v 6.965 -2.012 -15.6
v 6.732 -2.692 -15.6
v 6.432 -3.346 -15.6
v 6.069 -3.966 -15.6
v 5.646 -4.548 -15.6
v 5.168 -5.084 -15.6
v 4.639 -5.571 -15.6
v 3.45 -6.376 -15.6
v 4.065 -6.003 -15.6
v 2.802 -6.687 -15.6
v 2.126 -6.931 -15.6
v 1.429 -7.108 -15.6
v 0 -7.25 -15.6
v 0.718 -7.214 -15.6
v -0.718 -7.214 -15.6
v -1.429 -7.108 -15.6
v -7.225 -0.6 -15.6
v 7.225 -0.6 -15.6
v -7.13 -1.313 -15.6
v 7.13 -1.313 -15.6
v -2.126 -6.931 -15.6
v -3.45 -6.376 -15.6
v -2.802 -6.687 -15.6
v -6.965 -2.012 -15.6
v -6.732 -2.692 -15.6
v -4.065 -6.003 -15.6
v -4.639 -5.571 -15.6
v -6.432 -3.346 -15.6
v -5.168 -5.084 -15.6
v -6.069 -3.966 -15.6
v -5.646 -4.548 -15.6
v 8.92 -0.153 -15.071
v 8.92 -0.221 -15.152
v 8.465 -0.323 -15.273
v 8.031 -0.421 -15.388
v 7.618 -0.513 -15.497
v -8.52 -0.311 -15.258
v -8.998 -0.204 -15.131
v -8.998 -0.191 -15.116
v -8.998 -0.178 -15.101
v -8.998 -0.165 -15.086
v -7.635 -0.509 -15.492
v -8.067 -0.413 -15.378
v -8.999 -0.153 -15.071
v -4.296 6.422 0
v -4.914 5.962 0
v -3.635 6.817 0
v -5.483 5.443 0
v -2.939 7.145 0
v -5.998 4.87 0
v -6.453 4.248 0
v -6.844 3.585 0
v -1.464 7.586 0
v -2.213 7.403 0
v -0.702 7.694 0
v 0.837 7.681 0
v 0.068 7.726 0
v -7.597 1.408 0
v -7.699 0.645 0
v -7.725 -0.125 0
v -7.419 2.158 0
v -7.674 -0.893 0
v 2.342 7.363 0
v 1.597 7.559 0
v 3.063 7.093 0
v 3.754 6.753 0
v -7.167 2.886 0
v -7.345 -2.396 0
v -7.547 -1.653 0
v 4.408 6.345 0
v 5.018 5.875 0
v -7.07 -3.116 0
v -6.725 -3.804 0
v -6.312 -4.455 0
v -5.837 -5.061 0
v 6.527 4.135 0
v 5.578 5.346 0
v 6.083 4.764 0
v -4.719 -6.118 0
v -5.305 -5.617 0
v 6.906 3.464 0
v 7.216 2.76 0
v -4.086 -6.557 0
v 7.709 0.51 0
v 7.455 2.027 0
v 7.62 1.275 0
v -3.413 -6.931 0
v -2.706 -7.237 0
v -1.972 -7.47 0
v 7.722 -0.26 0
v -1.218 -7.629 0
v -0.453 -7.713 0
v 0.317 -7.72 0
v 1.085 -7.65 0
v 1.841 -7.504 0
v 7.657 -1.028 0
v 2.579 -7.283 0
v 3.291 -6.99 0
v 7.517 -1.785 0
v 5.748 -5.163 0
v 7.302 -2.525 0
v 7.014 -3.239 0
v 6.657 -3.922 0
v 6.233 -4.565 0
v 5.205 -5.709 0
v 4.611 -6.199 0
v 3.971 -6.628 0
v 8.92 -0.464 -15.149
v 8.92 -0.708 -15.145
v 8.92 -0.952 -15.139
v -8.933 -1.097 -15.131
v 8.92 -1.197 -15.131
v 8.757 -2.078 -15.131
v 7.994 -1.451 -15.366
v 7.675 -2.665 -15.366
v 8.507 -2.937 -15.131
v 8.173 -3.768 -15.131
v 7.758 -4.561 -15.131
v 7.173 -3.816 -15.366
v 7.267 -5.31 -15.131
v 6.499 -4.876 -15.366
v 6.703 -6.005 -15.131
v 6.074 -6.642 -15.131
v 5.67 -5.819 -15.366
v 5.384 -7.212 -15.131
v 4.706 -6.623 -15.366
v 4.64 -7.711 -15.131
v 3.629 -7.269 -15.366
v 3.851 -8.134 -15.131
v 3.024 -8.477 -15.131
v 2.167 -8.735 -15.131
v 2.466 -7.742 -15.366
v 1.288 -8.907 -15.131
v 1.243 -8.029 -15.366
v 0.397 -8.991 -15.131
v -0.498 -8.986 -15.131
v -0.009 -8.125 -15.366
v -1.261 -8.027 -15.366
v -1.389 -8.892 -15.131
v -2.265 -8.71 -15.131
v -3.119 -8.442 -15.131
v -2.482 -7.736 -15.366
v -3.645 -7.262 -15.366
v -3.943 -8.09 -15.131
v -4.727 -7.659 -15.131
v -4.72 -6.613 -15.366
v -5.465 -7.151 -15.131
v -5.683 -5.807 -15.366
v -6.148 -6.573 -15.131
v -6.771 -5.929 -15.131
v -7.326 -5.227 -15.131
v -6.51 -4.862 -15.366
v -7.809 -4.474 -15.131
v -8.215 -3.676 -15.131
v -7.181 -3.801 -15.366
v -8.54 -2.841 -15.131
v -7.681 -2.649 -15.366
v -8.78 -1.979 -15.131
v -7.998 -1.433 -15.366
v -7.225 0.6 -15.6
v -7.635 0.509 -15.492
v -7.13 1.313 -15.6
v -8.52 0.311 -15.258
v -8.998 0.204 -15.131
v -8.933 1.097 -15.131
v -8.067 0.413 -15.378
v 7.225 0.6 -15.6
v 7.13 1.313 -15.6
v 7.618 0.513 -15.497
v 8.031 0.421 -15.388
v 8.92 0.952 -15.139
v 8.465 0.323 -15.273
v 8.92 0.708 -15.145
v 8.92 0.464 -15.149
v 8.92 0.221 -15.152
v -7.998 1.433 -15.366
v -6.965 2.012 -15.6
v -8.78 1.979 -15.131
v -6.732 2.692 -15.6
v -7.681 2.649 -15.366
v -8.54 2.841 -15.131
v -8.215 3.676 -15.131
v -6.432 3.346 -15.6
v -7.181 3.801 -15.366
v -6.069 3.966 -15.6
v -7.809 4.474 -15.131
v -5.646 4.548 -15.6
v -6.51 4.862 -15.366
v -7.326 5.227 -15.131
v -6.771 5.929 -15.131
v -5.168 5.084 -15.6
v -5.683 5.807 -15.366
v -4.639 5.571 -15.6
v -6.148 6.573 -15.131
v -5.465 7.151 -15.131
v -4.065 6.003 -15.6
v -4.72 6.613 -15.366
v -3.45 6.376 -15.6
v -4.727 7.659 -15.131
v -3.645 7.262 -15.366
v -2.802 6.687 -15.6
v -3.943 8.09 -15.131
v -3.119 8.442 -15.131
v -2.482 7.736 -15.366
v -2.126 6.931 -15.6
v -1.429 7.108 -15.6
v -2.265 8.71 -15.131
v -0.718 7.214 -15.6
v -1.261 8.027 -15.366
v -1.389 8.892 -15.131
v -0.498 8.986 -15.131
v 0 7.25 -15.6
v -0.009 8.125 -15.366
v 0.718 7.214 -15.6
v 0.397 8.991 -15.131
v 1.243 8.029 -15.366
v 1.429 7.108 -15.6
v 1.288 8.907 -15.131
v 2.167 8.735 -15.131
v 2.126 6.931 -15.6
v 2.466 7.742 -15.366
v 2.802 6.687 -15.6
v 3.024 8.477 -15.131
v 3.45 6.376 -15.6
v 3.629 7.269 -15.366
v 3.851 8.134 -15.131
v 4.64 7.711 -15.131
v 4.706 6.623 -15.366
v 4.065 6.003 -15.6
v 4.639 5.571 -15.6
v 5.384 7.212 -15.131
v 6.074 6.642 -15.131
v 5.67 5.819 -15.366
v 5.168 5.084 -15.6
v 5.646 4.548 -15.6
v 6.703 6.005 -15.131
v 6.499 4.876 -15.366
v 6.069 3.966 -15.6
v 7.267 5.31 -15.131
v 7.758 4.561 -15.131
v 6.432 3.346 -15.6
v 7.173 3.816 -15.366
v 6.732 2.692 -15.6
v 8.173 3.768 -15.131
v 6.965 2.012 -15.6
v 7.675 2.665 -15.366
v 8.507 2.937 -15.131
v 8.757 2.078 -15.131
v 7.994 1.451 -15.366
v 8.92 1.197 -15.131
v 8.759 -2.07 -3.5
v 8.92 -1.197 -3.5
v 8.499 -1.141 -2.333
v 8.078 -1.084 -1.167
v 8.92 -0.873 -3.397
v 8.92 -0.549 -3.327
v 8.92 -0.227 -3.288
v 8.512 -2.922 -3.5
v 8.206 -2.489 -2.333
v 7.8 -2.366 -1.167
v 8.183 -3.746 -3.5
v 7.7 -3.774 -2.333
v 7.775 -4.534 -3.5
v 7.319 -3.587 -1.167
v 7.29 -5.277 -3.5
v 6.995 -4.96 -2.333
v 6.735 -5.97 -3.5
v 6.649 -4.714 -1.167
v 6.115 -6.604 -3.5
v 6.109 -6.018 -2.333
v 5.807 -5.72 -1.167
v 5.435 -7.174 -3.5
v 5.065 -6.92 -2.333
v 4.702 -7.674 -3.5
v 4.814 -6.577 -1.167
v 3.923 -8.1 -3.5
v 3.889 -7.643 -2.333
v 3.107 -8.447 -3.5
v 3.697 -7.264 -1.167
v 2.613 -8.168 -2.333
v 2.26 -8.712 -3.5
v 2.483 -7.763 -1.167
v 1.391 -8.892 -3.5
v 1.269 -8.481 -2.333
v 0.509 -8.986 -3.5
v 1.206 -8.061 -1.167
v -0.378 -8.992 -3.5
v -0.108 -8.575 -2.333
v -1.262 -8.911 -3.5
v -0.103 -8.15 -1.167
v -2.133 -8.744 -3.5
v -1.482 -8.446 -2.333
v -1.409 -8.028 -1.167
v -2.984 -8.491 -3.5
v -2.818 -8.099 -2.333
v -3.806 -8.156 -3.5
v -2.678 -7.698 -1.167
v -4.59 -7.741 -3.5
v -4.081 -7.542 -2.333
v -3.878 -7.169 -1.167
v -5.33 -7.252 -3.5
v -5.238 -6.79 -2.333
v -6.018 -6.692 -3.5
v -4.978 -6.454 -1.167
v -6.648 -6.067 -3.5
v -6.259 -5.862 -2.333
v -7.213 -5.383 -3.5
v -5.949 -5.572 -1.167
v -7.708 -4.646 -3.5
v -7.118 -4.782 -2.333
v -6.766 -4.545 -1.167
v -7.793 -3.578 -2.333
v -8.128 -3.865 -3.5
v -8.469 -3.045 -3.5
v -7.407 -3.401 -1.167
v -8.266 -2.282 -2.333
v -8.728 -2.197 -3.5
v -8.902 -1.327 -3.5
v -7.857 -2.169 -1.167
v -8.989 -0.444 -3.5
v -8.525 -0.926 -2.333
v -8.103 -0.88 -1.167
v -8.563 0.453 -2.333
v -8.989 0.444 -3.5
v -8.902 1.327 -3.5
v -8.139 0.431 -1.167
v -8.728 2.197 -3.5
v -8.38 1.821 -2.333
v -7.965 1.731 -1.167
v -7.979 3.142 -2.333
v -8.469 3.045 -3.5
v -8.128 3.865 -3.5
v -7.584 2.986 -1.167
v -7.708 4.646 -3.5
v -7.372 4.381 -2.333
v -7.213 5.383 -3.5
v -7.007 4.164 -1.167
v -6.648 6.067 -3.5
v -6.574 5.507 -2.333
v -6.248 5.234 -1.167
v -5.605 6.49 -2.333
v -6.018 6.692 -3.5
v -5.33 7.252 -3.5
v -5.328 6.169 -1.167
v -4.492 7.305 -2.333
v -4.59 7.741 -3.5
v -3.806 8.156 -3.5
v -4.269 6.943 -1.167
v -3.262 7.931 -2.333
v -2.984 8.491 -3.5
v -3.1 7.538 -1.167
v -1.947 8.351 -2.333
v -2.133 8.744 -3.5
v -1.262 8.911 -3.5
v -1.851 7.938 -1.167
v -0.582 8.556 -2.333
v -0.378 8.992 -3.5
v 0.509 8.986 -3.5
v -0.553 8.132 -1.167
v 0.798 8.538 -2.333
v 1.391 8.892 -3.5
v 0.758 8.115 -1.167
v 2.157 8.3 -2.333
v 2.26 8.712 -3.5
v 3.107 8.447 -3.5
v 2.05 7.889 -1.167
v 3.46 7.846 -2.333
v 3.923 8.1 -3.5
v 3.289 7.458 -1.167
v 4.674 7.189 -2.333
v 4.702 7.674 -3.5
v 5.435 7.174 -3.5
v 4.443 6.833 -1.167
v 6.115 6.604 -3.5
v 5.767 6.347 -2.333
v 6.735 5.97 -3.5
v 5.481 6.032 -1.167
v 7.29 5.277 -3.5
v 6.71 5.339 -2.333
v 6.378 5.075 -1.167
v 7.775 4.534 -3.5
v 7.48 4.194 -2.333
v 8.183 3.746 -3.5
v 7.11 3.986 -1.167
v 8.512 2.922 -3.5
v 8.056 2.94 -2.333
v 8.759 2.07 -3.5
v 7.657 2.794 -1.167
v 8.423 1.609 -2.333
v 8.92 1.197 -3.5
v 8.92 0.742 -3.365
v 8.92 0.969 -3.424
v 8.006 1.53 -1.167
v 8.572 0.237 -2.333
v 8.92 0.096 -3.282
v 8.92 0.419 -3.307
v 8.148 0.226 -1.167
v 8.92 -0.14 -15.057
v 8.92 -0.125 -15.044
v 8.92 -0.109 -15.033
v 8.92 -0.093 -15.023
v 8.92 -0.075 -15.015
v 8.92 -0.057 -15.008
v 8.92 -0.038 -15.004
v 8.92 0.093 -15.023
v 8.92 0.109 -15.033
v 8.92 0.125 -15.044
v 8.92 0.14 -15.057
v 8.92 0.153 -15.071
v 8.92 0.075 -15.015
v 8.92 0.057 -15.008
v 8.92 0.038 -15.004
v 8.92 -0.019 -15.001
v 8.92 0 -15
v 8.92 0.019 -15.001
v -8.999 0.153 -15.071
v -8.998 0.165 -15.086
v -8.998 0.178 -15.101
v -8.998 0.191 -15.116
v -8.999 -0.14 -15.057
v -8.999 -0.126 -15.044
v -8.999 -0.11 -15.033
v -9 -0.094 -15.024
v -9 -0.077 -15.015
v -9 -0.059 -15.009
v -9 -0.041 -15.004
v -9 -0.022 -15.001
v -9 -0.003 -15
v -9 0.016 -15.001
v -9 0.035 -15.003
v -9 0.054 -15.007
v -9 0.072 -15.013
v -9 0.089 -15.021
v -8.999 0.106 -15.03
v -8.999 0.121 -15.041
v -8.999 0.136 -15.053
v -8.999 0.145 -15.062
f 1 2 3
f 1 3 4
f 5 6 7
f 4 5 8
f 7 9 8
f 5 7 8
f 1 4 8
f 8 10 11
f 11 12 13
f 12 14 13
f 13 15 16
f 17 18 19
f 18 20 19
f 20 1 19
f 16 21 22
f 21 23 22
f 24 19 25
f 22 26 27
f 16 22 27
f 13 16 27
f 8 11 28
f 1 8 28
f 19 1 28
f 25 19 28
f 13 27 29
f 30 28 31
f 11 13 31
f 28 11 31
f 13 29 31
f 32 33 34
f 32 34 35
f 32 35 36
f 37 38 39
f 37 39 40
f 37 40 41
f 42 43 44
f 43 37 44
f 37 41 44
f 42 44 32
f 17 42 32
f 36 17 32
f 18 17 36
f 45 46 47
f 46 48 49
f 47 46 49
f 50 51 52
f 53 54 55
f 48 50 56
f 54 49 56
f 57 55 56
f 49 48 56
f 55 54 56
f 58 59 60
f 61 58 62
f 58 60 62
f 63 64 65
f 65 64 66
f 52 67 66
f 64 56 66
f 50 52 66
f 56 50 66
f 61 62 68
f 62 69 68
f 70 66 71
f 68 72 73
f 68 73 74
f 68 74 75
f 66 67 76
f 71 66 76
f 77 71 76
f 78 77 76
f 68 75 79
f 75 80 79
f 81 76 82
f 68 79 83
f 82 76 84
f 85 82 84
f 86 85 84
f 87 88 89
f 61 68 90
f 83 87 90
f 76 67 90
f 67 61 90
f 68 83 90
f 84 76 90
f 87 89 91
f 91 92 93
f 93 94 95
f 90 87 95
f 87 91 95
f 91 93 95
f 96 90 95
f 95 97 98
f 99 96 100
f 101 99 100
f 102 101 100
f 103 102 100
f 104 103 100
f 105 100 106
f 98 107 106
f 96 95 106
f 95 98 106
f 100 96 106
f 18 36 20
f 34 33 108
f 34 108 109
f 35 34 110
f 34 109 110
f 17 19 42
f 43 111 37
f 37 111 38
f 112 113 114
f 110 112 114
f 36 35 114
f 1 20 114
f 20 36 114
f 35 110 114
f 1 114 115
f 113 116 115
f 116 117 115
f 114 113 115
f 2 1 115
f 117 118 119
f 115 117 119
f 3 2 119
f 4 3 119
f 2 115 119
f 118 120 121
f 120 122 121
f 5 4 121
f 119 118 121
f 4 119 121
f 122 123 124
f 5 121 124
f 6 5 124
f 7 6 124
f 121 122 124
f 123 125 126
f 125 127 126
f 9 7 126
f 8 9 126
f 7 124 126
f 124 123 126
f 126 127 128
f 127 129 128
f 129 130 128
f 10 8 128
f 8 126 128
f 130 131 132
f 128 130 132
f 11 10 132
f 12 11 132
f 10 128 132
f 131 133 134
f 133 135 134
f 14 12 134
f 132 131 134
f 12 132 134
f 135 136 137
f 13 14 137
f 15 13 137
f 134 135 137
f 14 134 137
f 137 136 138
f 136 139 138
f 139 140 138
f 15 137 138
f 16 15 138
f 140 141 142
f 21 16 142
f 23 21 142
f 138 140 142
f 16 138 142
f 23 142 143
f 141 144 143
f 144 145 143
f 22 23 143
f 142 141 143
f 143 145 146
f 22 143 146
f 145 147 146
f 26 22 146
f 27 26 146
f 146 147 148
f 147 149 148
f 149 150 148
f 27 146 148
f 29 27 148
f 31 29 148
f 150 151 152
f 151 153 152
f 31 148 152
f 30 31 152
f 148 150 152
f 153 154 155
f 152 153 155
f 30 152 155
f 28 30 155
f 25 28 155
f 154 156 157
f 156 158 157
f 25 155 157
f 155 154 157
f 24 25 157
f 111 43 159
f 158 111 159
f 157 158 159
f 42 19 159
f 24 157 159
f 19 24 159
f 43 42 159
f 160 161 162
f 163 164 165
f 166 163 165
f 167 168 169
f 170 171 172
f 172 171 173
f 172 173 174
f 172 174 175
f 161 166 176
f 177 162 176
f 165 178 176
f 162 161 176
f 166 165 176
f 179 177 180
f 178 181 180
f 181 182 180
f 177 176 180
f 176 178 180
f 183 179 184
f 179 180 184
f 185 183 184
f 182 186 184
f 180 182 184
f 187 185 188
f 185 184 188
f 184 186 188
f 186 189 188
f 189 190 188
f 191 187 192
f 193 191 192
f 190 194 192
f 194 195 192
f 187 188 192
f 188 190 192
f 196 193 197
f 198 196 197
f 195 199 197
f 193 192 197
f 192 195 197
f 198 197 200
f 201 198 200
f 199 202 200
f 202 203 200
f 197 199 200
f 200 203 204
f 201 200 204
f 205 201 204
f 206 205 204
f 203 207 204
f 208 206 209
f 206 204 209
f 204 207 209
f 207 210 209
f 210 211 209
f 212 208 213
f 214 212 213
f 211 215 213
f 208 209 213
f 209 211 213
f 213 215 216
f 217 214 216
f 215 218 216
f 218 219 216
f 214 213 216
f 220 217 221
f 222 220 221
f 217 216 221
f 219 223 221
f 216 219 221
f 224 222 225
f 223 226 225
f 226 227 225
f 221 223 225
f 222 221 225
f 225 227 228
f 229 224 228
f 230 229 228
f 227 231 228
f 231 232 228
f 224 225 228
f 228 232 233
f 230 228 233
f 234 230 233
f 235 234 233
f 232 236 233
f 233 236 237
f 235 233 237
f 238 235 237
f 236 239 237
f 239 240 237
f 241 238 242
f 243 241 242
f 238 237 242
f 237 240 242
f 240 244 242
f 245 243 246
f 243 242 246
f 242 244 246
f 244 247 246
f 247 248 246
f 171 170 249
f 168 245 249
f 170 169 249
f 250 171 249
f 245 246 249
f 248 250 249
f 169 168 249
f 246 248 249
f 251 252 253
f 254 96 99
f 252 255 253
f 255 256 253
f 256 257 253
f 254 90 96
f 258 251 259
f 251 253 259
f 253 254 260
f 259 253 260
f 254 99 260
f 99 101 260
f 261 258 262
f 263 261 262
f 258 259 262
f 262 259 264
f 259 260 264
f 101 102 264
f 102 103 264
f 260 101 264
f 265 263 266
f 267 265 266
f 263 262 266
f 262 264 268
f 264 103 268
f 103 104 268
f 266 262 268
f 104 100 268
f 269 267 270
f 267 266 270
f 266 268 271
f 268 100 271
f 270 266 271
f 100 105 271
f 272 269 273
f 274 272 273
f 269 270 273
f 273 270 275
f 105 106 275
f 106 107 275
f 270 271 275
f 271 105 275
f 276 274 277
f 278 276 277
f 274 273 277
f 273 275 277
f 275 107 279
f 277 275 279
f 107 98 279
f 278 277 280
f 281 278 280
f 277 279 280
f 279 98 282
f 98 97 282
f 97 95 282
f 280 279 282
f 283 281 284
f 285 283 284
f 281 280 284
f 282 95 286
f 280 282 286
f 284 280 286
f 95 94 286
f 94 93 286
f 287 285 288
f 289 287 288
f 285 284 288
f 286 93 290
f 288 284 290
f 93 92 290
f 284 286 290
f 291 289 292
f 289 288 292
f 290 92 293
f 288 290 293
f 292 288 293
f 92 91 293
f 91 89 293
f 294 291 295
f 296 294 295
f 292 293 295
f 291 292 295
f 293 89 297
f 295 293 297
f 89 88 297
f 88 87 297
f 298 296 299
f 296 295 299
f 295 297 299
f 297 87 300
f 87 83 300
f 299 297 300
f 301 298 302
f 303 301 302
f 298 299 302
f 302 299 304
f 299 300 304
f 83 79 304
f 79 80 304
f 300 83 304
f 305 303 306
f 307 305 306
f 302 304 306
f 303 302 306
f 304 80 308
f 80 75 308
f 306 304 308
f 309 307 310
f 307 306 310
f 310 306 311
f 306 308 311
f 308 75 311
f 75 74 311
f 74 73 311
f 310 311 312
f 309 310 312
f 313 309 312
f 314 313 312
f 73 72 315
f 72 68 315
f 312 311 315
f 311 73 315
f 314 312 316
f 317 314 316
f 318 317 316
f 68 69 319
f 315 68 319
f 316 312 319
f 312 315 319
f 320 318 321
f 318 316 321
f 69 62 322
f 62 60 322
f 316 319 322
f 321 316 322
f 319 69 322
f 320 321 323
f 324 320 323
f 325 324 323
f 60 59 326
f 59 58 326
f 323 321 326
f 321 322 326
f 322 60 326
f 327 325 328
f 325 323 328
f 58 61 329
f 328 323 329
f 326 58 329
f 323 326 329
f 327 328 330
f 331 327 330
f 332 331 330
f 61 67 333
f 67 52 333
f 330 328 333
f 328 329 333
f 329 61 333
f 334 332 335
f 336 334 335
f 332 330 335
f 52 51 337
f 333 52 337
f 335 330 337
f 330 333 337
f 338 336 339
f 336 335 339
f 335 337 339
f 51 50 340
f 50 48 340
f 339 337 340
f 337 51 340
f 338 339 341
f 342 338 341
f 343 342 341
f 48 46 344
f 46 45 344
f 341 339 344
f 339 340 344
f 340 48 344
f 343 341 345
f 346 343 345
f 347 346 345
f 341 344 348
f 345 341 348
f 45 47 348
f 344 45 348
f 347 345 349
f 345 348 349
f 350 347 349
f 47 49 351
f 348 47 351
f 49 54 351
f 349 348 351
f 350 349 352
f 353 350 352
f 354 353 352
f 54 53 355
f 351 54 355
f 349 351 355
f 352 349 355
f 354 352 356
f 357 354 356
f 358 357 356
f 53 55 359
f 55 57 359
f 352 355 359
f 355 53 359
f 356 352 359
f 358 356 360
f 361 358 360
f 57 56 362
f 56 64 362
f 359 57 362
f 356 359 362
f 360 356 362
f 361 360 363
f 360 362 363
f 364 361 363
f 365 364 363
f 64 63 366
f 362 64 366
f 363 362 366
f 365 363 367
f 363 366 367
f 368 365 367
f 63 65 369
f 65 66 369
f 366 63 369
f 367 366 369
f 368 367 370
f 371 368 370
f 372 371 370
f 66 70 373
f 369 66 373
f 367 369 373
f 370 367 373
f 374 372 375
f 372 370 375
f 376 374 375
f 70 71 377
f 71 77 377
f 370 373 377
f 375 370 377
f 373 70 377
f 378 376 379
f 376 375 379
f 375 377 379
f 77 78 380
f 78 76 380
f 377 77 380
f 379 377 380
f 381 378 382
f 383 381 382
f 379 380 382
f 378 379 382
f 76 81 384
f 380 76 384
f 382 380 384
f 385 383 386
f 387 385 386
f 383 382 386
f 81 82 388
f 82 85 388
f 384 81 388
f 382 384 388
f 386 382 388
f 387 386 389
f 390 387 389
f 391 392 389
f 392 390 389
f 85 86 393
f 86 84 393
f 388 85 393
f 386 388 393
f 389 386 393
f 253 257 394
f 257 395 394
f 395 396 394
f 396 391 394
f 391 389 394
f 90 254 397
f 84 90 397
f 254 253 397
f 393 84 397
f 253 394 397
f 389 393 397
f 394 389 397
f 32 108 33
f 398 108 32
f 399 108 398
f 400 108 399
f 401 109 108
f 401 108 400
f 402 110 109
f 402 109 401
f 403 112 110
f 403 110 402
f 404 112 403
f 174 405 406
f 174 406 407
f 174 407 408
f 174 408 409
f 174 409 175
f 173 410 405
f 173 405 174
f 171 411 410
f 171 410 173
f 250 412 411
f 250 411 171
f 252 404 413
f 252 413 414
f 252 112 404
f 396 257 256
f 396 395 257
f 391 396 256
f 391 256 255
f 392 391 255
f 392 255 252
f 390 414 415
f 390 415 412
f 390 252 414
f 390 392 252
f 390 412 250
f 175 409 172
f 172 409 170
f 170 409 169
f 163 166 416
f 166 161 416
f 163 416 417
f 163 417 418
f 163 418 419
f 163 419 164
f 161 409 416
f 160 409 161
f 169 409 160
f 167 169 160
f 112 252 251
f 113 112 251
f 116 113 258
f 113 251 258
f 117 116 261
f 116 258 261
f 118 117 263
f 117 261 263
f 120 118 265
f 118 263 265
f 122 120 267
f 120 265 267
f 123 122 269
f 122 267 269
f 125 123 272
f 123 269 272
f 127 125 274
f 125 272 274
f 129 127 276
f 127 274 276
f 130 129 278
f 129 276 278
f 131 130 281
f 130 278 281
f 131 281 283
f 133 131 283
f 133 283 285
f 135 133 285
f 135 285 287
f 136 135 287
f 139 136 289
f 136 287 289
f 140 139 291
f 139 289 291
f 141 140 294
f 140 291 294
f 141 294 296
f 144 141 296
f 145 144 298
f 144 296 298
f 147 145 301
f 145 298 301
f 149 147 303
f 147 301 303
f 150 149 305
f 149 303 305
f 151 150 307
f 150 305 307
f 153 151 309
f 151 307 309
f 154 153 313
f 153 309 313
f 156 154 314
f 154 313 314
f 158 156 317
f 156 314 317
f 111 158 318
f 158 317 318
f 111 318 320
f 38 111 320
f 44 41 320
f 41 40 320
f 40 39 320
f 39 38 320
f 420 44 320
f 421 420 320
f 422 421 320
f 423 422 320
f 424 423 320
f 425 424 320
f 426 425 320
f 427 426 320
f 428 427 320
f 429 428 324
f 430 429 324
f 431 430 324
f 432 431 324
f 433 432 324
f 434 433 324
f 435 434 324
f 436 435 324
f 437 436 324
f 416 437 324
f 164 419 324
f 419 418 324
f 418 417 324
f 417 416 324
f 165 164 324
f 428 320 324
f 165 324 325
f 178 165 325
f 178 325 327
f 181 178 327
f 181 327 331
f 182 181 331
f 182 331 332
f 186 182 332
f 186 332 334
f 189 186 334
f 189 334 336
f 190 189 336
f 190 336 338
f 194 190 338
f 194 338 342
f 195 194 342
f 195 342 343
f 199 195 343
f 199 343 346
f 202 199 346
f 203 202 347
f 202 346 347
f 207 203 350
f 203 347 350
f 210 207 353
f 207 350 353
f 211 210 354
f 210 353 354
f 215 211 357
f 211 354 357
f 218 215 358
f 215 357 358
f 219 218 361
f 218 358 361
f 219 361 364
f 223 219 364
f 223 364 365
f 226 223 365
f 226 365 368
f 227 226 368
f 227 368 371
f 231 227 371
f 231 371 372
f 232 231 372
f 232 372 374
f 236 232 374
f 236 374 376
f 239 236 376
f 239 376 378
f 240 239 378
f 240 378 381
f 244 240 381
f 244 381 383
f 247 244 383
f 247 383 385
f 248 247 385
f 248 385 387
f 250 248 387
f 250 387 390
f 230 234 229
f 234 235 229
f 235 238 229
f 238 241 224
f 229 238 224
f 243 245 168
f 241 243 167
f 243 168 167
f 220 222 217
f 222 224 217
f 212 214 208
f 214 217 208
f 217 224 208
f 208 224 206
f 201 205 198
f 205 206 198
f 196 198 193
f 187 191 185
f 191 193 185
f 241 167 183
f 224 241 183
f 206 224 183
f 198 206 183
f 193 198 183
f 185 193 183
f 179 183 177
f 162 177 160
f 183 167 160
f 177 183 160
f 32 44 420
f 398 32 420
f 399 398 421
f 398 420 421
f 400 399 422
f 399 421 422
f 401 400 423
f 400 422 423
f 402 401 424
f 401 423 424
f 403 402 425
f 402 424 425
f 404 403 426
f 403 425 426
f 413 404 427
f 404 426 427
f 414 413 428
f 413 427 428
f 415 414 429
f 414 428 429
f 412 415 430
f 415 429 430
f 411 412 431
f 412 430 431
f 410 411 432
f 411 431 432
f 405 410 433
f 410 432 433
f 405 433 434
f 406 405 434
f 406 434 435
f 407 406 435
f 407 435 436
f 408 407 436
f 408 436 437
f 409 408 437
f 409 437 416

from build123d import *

# Parameters (mm, degrees)
SKETCH2_W               = 3.87532504
SKETCH2_H               = 22.790076604
CUT_EXTRUDE1_DEPTH      = 21.133554083
CUT_EXTRUDE2_DEPTH      = 21.133554083
CUT_EXTRUDE2_DEPTH_BACK = 21.133554083


with BuildPart() as part:
    # Sketch1 → Revolve1 (revolve)
    with BuildSketch(Plane(origin=(0, 0, 0), x_dir=(0, 0, -1), z_dir=(1, 0, 0)), mode=Mode.PRIVATE) as revolve1_sk:
        Polygon((0, 0), (15.6, 0), (15.6, 7.25), (15.131088913, 9), (3.5, 9), (0, 7.72610418), align=None)
    revolve(revolve1_sk.sketch.rotate(Axis((0, 0, 0), (0, 0, -1)), 97.645107459), axis=Axis((0, 0, 0), (0, 0, -1)))

    # Sketch2 → Cut-Extrude1 (cut, through all)
    with BuildSketch(Plane.XY):
        with Locations((10.85766252, -0.726684939)):
            Rectangle(SKETCH2_W, SKETCH2_H)
    extrude(amount=-CUT_EXTRUDE1_DEPTH, mode=Mode.SUBTRACT)

    # Sketch3 → Cut-Extrude2 (cut, two sides: drawn at the far end of the back side and taken through both)
    with BuildSketch(Plane(origin=(0, 0, 0), x_dir=(0, 0, -1), z_dir=(1, 0, 0)).offset(-CUT_EXTRUDE2_DEPTH_BACK)):
        with BuildLine():
            Line((15.070887618, 0.152741588), (15.6, 0.6))
            Line((15.6, 0.6), (15.6, -0.6))
            Line((15.6, -0.6), (15.070887618, -0.152741588))
            ThreePointArc((15.070887618, -0.152741588), (15, 0), (15.070887618, 0.152741588))
        make_face()
    extrude(amount=CUT_EXTRUDE2_DEPTH + CUT_EXTRUDE2_DEPTH_BACK, mode=Mode.SUBTRACT)


solid = part.part
